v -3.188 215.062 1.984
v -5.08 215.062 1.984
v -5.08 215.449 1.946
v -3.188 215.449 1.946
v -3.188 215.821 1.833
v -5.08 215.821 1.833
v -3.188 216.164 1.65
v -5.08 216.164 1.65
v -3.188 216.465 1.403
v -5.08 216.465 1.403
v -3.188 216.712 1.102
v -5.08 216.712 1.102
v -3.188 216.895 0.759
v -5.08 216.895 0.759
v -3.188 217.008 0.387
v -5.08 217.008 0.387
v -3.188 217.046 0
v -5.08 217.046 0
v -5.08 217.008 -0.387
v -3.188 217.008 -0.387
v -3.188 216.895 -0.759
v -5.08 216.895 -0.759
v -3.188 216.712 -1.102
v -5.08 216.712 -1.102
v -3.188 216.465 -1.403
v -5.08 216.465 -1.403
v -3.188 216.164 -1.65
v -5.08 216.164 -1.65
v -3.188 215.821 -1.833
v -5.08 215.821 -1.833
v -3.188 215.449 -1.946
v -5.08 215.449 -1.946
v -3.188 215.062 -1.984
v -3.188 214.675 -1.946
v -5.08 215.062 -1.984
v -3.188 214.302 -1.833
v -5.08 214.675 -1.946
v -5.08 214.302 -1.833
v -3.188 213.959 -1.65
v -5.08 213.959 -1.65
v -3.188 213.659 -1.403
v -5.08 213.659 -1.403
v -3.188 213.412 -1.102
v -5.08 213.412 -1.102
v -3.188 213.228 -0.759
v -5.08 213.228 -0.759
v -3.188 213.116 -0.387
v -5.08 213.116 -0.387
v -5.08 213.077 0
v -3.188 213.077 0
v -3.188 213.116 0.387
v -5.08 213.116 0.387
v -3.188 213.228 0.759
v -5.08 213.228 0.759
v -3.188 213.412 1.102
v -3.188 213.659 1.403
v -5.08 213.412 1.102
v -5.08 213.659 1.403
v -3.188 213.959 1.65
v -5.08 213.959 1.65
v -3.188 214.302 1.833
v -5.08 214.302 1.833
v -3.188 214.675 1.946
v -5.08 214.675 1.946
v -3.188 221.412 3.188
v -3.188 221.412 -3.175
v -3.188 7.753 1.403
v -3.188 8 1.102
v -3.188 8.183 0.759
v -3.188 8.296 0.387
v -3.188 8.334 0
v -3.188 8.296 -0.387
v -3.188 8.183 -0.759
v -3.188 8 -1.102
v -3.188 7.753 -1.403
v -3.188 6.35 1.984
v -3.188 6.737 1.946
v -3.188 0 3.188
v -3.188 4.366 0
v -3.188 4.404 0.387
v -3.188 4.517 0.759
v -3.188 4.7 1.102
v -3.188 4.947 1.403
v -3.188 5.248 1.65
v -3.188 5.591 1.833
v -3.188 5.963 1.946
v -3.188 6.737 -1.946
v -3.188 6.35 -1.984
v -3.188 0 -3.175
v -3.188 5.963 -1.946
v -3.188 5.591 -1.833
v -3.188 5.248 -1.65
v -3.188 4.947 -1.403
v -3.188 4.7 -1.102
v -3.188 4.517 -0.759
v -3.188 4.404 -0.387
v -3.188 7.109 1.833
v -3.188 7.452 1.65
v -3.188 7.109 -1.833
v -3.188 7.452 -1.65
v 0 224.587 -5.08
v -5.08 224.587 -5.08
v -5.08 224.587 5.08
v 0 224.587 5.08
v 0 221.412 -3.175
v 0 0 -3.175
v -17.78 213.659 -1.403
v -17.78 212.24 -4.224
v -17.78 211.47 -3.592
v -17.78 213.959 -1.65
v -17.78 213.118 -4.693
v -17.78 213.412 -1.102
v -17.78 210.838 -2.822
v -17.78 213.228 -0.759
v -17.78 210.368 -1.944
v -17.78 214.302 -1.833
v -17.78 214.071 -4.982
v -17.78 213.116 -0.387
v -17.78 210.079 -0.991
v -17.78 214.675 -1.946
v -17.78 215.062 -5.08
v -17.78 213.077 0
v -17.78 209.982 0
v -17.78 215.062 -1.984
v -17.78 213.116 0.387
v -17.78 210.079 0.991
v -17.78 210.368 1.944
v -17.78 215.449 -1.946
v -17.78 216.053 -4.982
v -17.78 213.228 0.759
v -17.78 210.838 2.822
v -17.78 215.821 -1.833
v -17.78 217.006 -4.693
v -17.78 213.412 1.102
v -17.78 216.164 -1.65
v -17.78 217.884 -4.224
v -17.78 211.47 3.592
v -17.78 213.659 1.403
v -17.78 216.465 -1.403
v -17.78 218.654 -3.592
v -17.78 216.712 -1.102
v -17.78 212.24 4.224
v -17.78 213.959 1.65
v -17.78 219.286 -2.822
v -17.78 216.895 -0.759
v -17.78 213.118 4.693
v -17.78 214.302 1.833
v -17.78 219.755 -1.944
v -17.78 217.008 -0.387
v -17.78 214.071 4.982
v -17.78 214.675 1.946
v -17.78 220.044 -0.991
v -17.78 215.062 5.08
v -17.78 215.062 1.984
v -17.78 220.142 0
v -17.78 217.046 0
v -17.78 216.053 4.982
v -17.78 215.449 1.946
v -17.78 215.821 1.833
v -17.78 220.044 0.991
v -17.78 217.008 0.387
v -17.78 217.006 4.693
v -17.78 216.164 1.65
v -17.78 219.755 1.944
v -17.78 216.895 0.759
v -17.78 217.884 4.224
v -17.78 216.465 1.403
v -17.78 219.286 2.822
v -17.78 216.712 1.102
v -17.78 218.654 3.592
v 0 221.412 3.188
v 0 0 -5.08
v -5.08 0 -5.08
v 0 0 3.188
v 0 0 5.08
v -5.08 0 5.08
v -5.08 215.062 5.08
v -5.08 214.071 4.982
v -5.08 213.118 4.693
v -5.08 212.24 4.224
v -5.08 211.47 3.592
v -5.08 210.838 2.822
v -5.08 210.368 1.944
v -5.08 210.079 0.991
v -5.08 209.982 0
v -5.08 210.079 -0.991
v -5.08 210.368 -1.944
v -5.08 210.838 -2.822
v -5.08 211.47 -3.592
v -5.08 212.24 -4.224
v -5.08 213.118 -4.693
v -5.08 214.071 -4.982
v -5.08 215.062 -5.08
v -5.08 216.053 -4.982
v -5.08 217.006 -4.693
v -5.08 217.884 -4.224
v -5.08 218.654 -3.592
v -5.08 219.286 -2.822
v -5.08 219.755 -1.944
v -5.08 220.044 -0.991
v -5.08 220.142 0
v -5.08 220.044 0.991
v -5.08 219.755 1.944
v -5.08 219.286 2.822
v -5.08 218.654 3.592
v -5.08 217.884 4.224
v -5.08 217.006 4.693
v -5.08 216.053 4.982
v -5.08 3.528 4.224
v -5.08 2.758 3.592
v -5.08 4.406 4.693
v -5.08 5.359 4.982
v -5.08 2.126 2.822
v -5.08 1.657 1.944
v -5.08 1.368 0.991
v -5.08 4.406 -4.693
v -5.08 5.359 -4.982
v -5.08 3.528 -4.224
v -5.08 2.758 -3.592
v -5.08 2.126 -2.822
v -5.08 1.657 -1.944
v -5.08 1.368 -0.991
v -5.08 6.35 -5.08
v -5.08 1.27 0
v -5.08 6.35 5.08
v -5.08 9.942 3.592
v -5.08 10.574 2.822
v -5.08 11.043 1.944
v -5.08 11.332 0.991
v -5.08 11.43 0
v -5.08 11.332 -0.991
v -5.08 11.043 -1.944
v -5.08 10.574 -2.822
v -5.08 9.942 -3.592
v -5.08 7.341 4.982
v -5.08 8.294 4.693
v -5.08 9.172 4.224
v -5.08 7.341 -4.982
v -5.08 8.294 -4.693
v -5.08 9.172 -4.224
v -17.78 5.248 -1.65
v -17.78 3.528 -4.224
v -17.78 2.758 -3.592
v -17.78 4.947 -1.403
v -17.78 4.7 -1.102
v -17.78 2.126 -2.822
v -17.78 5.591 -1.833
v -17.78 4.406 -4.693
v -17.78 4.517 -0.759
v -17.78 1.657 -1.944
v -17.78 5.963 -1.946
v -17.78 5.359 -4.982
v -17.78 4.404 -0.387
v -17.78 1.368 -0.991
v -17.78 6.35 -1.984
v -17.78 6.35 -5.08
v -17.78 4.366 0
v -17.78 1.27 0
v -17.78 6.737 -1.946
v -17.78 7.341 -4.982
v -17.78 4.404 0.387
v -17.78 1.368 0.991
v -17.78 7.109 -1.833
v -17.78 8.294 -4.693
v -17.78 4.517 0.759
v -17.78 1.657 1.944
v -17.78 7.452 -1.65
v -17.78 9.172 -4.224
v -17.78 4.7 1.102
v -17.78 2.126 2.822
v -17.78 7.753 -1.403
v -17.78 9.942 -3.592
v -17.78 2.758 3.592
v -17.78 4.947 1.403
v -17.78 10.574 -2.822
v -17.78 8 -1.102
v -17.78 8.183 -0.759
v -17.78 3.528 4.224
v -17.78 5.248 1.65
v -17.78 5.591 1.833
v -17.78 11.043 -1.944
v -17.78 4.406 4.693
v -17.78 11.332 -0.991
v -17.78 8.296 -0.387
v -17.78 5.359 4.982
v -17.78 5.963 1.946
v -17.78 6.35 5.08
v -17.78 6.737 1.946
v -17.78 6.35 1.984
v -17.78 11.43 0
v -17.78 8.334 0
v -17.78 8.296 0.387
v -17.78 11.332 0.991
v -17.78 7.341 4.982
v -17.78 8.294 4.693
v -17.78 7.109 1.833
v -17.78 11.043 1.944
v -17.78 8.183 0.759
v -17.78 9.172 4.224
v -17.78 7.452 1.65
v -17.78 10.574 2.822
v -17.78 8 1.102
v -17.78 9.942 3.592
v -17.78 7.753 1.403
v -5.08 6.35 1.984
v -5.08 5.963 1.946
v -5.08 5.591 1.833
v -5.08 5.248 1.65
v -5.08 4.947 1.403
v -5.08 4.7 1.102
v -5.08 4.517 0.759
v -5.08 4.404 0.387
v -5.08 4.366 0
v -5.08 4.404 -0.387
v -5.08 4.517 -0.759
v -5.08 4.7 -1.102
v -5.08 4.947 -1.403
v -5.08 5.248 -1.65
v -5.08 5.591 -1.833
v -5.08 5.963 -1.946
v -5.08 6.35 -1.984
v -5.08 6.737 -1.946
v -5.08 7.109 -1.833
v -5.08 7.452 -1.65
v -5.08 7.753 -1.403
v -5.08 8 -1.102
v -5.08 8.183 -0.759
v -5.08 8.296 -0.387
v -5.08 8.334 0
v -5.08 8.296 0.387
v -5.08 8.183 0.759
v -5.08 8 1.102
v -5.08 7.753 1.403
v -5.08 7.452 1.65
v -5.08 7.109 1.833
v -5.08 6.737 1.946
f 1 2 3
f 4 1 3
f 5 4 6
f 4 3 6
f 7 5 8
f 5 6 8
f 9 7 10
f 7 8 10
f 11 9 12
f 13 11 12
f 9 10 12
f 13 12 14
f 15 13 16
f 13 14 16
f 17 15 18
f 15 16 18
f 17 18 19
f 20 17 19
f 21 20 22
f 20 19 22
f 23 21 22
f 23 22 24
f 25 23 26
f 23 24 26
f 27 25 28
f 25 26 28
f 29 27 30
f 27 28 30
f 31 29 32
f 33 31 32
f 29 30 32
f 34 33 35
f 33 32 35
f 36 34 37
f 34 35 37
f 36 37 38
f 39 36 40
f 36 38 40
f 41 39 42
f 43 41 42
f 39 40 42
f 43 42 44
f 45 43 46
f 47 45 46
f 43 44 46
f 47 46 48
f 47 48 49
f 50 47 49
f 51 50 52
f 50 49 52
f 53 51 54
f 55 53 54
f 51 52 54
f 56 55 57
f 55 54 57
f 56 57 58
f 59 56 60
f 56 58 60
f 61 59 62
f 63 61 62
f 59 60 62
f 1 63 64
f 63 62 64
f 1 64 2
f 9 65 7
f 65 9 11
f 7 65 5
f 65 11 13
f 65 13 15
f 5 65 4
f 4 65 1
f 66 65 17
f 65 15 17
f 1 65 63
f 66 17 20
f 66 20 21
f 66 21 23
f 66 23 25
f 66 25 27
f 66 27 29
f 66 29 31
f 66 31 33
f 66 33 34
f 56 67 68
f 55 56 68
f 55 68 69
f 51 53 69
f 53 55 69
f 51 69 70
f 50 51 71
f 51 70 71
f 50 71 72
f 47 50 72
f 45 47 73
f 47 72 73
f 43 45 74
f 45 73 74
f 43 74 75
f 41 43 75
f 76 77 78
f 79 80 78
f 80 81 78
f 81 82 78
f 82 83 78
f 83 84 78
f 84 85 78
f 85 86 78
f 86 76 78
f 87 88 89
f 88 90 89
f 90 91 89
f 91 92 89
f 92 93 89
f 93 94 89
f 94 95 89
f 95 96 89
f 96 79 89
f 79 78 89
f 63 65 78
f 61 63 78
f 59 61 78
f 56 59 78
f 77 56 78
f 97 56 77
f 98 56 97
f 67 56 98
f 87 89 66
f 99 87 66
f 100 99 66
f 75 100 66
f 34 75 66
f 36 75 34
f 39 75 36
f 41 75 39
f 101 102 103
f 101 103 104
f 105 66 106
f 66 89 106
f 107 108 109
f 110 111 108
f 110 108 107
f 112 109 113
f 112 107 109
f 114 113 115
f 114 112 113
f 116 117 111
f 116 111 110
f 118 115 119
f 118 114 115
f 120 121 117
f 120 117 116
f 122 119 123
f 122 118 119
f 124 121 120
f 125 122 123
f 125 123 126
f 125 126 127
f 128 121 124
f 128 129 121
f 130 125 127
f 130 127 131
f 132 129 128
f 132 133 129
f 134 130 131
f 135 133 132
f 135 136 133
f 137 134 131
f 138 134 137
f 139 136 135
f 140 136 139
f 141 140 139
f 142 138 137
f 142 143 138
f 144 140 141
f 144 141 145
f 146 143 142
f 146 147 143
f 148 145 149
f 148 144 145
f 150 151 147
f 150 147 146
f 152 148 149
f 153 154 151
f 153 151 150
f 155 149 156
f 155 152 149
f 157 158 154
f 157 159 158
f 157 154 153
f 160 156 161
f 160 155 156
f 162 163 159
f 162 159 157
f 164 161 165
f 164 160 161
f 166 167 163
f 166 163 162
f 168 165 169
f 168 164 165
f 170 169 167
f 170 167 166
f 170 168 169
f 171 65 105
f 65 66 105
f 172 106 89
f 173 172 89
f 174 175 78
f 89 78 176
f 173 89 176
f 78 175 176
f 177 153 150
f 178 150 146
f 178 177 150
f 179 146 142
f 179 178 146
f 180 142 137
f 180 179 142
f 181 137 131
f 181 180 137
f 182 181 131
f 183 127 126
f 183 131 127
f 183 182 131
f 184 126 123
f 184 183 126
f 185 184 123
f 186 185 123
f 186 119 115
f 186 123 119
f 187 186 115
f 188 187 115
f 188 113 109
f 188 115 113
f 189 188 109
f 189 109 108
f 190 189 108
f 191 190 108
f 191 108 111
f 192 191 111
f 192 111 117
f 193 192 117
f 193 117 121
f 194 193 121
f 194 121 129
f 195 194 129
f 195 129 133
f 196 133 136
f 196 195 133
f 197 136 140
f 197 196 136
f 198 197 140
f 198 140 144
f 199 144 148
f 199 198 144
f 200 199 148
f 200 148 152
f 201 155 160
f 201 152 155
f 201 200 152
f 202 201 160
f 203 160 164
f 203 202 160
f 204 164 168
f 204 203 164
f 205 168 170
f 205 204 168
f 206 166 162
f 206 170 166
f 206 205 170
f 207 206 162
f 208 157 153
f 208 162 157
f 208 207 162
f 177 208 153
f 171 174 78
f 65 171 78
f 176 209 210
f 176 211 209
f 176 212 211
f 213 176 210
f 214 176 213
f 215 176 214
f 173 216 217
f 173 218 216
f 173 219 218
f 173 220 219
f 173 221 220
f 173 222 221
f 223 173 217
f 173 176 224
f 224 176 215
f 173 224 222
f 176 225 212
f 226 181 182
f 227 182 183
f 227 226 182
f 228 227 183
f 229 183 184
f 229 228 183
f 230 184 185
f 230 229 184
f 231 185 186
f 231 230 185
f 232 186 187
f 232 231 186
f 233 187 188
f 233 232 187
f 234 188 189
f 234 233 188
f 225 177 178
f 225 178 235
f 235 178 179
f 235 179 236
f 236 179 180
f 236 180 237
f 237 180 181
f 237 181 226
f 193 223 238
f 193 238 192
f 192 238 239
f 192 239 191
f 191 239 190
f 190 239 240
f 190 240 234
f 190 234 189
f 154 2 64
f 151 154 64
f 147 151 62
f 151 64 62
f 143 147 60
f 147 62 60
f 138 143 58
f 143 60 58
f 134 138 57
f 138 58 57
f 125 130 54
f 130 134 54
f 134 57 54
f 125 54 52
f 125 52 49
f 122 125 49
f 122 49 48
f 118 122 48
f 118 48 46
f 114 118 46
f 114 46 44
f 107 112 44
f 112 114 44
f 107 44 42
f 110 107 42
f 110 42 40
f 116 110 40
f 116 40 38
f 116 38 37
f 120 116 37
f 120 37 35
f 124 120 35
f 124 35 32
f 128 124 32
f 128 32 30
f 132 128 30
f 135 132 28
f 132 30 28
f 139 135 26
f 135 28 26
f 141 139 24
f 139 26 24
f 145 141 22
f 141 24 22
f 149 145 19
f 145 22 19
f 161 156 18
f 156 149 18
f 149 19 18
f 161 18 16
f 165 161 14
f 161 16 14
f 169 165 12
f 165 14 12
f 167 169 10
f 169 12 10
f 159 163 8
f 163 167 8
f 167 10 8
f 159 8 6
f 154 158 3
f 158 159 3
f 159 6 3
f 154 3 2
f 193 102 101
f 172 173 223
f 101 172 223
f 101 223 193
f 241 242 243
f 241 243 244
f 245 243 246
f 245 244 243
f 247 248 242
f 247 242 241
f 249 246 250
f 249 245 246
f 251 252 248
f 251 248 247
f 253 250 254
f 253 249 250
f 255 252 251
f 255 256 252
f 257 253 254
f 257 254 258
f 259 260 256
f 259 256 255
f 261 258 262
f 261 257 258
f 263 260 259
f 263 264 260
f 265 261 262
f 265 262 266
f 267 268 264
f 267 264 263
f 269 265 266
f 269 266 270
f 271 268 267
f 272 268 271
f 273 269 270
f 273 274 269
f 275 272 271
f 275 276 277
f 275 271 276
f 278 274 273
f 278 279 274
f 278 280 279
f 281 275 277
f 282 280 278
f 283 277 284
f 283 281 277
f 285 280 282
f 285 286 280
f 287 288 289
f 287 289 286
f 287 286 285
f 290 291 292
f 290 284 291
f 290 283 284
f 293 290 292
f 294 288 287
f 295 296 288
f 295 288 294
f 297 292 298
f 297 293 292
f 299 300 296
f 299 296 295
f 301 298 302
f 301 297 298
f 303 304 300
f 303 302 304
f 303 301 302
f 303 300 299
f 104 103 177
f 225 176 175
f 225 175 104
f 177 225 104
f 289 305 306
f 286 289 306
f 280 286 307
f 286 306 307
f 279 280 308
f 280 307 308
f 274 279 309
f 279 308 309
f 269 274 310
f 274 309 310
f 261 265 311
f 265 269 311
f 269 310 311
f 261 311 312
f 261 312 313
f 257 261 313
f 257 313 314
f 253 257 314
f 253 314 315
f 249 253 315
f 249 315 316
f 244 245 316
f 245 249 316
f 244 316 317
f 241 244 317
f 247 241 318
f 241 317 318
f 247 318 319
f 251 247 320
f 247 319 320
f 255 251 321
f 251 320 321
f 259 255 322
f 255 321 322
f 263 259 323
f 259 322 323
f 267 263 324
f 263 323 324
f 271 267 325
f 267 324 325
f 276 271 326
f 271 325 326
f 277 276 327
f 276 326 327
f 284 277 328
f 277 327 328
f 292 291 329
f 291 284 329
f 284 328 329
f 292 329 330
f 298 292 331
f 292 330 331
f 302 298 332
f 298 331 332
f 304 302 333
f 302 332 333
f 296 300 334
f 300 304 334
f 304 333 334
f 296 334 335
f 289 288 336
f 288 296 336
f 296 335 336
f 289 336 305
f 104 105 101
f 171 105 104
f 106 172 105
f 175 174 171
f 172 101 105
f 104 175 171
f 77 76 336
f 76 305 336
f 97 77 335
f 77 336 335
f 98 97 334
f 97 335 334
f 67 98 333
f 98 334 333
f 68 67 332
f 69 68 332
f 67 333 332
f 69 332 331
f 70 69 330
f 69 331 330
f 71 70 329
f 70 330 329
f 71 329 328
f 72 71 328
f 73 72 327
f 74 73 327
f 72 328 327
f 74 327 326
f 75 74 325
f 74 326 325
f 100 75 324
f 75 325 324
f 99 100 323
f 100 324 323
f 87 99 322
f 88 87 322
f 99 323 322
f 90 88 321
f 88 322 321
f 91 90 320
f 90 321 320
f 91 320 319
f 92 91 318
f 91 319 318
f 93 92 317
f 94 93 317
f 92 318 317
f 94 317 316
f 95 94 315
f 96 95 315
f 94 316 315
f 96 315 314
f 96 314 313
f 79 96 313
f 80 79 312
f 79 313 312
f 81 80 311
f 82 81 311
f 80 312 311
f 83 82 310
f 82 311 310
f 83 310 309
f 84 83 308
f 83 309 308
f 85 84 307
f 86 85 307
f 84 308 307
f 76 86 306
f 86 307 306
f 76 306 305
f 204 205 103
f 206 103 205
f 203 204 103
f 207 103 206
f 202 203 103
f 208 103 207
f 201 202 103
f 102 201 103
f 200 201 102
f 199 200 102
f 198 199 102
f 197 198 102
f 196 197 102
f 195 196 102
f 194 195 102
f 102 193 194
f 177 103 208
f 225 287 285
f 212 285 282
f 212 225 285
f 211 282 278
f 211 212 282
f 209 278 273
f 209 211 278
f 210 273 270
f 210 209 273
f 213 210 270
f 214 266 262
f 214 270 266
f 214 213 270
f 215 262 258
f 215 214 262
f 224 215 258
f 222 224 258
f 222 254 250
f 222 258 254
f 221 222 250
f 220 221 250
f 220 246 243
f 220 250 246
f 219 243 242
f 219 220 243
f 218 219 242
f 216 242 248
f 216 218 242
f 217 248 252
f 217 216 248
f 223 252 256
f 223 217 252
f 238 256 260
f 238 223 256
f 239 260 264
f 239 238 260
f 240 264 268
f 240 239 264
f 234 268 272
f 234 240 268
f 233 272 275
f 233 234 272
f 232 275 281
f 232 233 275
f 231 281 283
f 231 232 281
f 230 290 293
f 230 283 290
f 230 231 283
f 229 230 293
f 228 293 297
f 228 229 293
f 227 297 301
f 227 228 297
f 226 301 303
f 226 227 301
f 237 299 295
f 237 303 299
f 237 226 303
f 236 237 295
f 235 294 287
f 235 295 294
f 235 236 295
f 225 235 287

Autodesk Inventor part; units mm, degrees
ref_plane "YZ Plane" through (0, 0, 0) normal (1, 0, 0) x (0, 1, 0)
ref_plane "XZ Plane" through (0, 0, 0) normal (0, 1, 0) x (-1, 0, 0)
ref_plane "XY Plane" through (0, 0, 0) normal (0, 0, 1) x (1, 0, 0)
sketch "Sketch1" plane through (0, 0, 0) normal (0, 1, 0) x (-1, 0, 0)
  line L0 (0, 3.1877) -> (3.1877, 3.1877)
  line L1 (3.1877, 3.1877) -> (3.1877, -3.175)
  line L2 (3.1877, -3.175) -> (0, -3.175)
  line L3 (0, 5.08) -> (5.08, 5.08)
  line L4 (5.08, 5.08) -> (5.08, -5.08)
  line L5 (5.08, -5.08) -> (0, -5.08)
  line L6 (0, -5.08) -> (0, -3.175)
  line L7 (0, 3.1877) -> (0, 5.08)
  point P0 (0, 0)
  dimension "d0" = 3.1877
  dimension "d1" = 5.08
  dimension "d2" = 10.16
extrude "Extrusion1" add sketch "Sketch1" along normal blind 221.4118
sketch "Sketch2" plane through (-5.08, 0, -5.08) normal (-1, 0, 0) x (0, 0, 1)
  circle A0 centre (5.08, 6.35) radius 1.9844
  circle A1 centre (5.08, 215.0618) radius 1.9844
  point P0 (5.08, 0)
  dimension "d5" = 3.9688
  dimension "d6" = 3.9688
extrude "Extrusion2" cut sketch "Sketch2" against normal blind 221.4118
sketch "Sketch3" plane through (-5.08, 0, -5.08) normal (-1, 0, 0) x (0, 0, 1)
  circle A0 centre (5.08, 6.35) radius 5.08
  circle A1 centre (5.08, 215.0618) radius 1.9844 projected
  circle A2 centre (5.08, 215.0618) radius 5.08
  line L0 (10.16, 0) -> (10.16, 221.4118) projected
  circle A3 centre (5.08, 6.35) radius 1.9844 projected
  point P0 (5.08, 0)
  dimension "d9" = 10.16
extrude "Extrusion3" add sketch "Sketch3" along normal blind 12.7
sketch "Sketch4" plane through (0, 221.4118, 0) normal (0, 1, 0) x (1, 0, 0)
  line L0 (-5.08, -5.08) -> (0, -5.08) projected
  line L1 (-5.08, -5.08) -> (-5.08, 5.08) projected
  line L2 (0, -5.08) -> (-5.08, -5.08)
  line L3 (-5.08, -5.08) -> (-5.08, 5.08)
  line L4 (-5.08, 5.08) -> (0, 5.08)
  line L5 (0, 5.08) -> (0, -5.08)
  point P0 (0, 0)
extrude "Extrusion4" add sketch "Sketch4" along normal blind 3.175
sketch "Sketch5" plane through (-5.08, 6.35, -5.08) normal (-1, 0, 0) x (0, 0, 1)
  point P0 (5.08, -6.35)
properties part number "hs_intake_synchronizer"
